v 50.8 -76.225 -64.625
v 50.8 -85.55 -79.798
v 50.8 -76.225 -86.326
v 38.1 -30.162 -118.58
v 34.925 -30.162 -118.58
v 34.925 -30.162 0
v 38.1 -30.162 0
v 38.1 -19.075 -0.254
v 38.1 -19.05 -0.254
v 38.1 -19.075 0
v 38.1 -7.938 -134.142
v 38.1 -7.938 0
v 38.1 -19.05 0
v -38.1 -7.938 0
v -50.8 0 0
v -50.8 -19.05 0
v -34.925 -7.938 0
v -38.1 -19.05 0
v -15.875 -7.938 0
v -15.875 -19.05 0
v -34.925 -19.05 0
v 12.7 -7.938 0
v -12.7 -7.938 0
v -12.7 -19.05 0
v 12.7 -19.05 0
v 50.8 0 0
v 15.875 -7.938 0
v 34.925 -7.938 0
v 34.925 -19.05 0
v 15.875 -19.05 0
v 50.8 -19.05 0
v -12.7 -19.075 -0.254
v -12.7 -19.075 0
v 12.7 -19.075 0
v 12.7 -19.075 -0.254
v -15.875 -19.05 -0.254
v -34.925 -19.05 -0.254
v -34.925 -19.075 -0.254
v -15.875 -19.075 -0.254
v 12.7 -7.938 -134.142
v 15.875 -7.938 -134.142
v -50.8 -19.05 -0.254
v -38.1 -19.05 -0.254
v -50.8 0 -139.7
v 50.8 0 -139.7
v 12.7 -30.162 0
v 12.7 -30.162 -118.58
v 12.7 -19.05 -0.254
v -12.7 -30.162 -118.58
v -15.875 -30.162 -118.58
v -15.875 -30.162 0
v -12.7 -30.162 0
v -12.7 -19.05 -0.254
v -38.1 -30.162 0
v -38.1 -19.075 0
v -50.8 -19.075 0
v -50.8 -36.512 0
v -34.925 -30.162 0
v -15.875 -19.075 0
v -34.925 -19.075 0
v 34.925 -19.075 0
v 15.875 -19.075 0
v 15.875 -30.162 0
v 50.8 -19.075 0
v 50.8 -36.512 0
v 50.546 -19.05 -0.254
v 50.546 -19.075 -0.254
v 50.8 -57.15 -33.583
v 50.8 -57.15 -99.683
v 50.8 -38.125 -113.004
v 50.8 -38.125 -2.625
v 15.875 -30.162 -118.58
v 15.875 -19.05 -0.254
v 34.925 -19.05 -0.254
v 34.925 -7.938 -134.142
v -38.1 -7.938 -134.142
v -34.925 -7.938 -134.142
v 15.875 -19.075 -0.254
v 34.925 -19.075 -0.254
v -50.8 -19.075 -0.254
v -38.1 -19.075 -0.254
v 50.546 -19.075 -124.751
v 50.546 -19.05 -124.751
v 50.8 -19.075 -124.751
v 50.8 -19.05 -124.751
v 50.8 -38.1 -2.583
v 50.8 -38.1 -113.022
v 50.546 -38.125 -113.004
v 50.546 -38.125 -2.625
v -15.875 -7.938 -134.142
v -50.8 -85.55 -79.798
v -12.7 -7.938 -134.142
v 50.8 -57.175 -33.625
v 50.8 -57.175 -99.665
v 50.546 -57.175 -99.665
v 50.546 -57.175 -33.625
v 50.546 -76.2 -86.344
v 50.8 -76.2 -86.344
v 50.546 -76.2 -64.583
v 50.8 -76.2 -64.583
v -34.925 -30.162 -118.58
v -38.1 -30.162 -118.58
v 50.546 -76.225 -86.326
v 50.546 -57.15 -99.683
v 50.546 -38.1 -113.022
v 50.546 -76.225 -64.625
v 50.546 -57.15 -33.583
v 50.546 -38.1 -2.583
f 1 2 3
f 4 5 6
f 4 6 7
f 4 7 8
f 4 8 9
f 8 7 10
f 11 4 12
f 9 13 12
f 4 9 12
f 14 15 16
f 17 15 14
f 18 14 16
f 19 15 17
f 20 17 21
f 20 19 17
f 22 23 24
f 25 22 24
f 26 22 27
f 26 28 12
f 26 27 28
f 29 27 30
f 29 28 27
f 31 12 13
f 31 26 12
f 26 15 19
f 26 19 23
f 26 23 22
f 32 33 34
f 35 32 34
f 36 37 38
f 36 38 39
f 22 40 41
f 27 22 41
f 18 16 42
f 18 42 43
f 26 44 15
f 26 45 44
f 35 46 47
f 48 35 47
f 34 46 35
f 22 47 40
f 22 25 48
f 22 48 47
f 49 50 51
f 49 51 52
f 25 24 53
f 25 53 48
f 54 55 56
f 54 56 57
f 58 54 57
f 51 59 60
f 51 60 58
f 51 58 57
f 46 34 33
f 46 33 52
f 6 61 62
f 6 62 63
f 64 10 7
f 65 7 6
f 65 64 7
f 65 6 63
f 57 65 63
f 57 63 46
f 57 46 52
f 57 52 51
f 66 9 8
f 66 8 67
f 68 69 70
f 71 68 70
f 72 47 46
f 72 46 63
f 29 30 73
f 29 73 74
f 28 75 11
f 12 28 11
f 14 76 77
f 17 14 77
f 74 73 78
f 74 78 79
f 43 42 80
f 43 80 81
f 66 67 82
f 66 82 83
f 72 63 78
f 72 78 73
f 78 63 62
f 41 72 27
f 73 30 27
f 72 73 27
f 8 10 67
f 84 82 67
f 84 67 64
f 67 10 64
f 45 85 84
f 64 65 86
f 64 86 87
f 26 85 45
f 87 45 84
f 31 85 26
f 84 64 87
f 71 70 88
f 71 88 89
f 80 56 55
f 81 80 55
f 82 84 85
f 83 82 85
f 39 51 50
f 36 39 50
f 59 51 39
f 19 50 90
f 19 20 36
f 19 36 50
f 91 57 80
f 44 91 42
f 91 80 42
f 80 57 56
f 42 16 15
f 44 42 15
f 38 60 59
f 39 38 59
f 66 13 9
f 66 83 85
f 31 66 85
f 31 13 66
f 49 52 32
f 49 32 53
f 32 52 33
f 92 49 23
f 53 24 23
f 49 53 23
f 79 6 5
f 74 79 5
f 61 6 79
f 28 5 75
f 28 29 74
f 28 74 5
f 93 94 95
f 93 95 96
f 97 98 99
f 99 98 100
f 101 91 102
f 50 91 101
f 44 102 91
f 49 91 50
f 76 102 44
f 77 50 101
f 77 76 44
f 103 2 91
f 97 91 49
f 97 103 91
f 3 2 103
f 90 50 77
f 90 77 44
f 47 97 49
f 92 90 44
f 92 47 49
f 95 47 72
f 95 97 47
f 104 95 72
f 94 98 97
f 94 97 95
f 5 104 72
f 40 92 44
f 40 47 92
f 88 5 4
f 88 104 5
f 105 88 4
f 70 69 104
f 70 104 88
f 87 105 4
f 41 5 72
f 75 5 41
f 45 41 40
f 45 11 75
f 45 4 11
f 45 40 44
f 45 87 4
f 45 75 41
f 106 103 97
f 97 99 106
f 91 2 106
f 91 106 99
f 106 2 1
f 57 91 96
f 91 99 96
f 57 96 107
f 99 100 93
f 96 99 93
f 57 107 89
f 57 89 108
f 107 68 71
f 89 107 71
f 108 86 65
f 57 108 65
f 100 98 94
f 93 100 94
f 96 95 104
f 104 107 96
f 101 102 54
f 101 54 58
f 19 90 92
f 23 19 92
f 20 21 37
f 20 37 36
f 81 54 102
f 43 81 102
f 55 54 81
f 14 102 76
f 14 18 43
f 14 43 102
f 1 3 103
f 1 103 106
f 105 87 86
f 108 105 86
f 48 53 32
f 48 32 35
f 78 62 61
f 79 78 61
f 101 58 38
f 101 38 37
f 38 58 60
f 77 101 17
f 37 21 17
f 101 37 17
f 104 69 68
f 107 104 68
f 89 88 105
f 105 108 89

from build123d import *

# Parameters (mm, degrees)
F1_DEPTH  = 50.8
F2_W      = 3.175
F2_H      = 22.225
F3_DEPTH  = 135.1421026655
F5_W      = 101.6
F5_H      = 0.0254
F6_DEPTH  = 0.254
F8_DEPTH  = 101.601
F9_W      = 0.0254
F9_H      = 124.7511431575
F9_H_2    = 118.2847470045
F9_H_3    = 108.944401145
F9_H_4    = 108.2259044051
F10_DEPTH = 0.254


with BuildPart() as f1:
    # F0 (on Right) → F1 (new body, symmetric)
    with BuildSketch(Plane.YZ):
        Polygon((0, -139.7), (0, 0), (-95.25, 0), (-95.25, -73.0052319855), align=None)
    extrude(amount=F1_DEPTH, both=True)

    # F2 (on face) → F3 (cut, up to face)
    with BuildSketch(Plane.XY):
        with Locations((-36.5125, -19.05)):
            Rectangle(F2_W, F2_H)
        with Locations((-14.2875, -19.05)):
            Rectangle(F2_W, F2_H)
        with Locations((14.2875, -19.05)):
            Rectangle(F2_W, F2_H)
        with Locations((36.5125, -19.05)):
            Rectangle(F2_W, F2_H)
    extrude(amount=-F3_DEPTH, mode=Mode.SUBTRACT)

    # F5 (on face) → F6 (cut)
    with BuildSketch(Plane.XY):
        with Locations((0, -19.0627)):
            Rectangle(F5_W, F5_H)
        with Locations((0, -38.1127)):
            Rectangle(F5_W, F5_H)
        with Locations((0, -57.1627)):
            Rectangle(F5_W, F5_H)
    extrude(amount=-F6_DEPTH, mode=Mode.SUBTRACT)

    # F7 (on face) → F8 (cut, through all)
    with BuildSketch(Plane.YZ.offset(50.8)):
        Polygon((-105.2813167576, -79.797580018), (-85.5495216963, -79.797580018), (-36.5125, 0), (-105.2813167576, 0), align=None)
    extrude(amount=-F8_DEPTH, mode=Mode.SUBTRACT)

    # F9 (on face) → F10 (cut)
    with BuildSketch(Plane.YZ.offset(50.8)):
        with Locations((-19.0627, -62.3755715787)):
            Rectangle(F9_W, F9_H)
        with Locations((-38.1127, -59.1423735023)):
            Rectangle(F9_W, F9_H_2)
        with Locations((-57.1627, -54.4722005725)):
            Rectangle(F9_W, F9_H_3)
        with Locations((-76.2127, -54.1129522026)):
            Rectangle(F9_W, F9_H_4)
    extrude(amount=-F10_DEPTH, mode=Mode.SUBTRACT)


solid = f1.part
